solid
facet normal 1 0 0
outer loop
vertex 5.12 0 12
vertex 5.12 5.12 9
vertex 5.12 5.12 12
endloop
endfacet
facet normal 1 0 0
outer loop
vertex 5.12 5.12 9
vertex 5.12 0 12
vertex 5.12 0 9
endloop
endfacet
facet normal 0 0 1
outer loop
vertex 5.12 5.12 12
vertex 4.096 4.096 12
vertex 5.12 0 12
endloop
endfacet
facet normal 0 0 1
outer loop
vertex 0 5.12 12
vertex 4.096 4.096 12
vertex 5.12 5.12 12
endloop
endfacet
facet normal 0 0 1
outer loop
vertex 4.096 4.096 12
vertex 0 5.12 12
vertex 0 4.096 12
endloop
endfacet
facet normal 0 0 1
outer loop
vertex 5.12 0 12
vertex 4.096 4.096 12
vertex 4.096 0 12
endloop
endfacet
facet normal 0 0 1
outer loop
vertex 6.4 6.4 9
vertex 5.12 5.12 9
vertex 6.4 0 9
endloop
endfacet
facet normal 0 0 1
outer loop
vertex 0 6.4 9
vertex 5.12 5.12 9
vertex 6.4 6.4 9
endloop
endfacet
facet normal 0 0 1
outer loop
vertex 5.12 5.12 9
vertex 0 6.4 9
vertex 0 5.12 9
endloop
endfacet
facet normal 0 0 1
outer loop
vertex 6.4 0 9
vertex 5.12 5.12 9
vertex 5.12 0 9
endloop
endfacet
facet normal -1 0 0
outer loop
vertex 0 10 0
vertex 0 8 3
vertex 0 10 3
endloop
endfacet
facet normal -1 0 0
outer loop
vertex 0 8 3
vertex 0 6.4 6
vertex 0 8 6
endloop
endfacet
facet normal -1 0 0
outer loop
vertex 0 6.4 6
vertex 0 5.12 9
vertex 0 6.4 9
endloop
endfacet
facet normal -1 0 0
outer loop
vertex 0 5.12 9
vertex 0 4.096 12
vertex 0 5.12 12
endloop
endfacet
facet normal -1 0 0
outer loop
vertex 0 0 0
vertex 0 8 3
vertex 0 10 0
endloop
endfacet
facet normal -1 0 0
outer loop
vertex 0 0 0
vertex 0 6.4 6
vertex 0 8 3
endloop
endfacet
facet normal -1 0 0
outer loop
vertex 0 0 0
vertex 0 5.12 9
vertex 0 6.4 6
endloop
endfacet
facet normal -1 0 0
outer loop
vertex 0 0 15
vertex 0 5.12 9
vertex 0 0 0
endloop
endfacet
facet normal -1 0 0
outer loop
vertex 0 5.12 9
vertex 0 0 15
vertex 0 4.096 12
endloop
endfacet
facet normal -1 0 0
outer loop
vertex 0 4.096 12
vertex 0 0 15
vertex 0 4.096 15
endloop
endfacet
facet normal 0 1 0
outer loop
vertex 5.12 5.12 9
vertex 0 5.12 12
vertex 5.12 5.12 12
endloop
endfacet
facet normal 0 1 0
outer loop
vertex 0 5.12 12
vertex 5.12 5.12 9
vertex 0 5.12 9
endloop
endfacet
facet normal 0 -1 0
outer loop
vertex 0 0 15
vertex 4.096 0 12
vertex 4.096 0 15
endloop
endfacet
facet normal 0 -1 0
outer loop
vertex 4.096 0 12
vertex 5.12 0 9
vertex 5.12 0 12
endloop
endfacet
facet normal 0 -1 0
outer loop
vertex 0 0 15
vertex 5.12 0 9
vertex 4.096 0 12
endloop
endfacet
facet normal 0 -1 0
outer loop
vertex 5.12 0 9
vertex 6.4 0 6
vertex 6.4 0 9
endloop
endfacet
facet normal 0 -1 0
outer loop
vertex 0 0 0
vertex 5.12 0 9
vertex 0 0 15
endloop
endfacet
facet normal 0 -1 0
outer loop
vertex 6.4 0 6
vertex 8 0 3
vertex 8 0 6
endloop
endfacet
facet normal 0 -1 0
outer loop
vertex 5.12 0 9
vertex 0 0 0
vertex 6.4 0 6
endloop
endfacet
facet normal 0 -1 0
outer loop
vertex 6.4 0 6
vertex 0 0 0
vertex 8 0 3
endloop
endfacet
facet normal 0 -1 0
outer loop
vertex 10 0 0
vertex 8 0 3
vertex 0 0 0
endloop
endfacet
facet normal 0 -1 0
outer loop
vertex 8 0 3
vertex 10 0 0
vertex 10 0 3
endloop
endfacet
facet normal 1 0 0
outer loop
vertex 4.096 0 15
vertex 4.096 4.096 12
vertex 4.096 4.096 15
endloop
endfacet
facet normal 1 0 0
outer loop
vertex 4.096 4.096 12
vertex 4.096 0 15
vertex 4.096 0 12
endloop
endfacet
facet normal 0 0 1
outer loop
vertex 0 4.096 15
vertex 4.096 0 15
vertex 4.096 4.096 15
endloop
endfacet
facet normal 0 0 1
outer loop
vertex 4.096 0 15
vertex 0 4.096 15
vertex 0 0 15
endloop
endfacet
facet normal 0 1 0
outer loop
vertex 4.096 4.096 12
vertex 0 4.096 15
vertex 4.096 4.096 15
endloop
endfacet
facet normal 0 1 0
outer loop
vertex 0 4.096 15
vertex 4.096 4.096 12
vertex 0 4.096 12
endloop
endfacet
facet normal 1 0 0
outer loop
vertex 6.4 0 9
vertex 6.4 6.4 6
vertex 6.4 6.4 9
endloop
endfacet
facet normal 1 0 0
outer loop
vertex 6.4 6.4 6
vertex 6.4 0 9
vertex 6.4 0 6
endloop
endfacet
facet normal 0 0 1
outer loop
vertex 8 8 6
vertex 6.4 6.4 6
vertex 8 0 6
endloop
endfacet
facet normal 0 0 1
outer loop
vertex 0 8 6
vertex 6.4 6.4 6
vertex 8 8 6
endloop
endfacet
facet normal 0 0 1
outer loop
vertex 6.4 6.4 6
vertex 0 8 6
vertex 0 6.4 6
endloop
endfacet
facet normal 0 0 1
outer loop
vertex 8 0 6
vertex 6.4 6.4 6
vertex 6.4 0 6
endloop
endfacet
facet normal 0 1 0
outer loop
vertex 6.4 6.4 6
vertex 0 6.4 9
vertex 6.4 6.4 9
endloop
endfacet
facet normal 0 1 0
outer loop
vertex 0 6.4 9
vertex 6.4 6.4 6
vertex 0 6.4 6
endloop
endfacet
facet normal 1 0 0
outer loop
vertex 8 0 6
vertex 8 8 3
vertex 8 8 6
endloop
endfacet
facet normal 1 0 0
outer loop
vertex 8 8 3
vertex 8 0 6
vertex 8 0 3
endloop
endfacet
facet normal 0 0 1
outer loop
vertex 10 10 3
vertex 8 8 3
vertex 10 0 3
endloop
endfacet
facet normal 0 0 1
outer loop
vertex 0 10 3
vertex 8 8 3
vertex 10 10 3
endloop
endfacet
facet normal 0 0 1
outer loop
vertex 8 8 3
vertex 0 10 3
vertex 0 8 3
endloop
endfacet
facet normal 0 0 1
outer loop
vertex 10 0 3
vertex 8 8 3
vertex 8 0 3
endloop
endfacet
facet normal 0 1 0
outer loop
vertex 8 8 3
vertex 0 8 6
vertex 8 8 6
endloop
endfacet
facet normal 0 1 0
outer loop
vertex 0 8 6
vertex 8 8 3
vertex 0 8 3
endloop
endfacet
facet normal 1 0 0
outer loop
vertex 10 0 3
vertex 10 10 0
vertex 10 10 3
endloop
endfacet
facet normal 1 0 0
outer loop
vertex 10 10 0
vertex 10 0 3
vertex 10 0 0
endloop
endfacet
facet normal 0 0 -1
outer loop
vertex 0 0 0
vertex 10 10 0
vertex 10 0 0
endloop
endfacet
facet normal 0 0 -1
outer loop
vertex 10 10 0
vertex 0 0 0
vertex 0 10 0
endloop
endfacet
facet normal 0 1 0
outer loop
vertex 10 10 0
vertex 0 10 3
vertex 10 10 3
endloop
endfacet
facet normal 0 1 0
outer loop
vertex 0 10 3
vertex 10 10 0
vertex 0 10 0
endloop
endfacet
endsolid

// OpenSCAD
// Construct: a recursive module building a tapering stack.
module tower(n, w) {
    if (n > 0) {
        translate([0, 0, (5 - n) * 3]) cube([w, w, 3], center = false);
        tower(n - 1, w * 0.8);
    }
}
tower(5, 10);
